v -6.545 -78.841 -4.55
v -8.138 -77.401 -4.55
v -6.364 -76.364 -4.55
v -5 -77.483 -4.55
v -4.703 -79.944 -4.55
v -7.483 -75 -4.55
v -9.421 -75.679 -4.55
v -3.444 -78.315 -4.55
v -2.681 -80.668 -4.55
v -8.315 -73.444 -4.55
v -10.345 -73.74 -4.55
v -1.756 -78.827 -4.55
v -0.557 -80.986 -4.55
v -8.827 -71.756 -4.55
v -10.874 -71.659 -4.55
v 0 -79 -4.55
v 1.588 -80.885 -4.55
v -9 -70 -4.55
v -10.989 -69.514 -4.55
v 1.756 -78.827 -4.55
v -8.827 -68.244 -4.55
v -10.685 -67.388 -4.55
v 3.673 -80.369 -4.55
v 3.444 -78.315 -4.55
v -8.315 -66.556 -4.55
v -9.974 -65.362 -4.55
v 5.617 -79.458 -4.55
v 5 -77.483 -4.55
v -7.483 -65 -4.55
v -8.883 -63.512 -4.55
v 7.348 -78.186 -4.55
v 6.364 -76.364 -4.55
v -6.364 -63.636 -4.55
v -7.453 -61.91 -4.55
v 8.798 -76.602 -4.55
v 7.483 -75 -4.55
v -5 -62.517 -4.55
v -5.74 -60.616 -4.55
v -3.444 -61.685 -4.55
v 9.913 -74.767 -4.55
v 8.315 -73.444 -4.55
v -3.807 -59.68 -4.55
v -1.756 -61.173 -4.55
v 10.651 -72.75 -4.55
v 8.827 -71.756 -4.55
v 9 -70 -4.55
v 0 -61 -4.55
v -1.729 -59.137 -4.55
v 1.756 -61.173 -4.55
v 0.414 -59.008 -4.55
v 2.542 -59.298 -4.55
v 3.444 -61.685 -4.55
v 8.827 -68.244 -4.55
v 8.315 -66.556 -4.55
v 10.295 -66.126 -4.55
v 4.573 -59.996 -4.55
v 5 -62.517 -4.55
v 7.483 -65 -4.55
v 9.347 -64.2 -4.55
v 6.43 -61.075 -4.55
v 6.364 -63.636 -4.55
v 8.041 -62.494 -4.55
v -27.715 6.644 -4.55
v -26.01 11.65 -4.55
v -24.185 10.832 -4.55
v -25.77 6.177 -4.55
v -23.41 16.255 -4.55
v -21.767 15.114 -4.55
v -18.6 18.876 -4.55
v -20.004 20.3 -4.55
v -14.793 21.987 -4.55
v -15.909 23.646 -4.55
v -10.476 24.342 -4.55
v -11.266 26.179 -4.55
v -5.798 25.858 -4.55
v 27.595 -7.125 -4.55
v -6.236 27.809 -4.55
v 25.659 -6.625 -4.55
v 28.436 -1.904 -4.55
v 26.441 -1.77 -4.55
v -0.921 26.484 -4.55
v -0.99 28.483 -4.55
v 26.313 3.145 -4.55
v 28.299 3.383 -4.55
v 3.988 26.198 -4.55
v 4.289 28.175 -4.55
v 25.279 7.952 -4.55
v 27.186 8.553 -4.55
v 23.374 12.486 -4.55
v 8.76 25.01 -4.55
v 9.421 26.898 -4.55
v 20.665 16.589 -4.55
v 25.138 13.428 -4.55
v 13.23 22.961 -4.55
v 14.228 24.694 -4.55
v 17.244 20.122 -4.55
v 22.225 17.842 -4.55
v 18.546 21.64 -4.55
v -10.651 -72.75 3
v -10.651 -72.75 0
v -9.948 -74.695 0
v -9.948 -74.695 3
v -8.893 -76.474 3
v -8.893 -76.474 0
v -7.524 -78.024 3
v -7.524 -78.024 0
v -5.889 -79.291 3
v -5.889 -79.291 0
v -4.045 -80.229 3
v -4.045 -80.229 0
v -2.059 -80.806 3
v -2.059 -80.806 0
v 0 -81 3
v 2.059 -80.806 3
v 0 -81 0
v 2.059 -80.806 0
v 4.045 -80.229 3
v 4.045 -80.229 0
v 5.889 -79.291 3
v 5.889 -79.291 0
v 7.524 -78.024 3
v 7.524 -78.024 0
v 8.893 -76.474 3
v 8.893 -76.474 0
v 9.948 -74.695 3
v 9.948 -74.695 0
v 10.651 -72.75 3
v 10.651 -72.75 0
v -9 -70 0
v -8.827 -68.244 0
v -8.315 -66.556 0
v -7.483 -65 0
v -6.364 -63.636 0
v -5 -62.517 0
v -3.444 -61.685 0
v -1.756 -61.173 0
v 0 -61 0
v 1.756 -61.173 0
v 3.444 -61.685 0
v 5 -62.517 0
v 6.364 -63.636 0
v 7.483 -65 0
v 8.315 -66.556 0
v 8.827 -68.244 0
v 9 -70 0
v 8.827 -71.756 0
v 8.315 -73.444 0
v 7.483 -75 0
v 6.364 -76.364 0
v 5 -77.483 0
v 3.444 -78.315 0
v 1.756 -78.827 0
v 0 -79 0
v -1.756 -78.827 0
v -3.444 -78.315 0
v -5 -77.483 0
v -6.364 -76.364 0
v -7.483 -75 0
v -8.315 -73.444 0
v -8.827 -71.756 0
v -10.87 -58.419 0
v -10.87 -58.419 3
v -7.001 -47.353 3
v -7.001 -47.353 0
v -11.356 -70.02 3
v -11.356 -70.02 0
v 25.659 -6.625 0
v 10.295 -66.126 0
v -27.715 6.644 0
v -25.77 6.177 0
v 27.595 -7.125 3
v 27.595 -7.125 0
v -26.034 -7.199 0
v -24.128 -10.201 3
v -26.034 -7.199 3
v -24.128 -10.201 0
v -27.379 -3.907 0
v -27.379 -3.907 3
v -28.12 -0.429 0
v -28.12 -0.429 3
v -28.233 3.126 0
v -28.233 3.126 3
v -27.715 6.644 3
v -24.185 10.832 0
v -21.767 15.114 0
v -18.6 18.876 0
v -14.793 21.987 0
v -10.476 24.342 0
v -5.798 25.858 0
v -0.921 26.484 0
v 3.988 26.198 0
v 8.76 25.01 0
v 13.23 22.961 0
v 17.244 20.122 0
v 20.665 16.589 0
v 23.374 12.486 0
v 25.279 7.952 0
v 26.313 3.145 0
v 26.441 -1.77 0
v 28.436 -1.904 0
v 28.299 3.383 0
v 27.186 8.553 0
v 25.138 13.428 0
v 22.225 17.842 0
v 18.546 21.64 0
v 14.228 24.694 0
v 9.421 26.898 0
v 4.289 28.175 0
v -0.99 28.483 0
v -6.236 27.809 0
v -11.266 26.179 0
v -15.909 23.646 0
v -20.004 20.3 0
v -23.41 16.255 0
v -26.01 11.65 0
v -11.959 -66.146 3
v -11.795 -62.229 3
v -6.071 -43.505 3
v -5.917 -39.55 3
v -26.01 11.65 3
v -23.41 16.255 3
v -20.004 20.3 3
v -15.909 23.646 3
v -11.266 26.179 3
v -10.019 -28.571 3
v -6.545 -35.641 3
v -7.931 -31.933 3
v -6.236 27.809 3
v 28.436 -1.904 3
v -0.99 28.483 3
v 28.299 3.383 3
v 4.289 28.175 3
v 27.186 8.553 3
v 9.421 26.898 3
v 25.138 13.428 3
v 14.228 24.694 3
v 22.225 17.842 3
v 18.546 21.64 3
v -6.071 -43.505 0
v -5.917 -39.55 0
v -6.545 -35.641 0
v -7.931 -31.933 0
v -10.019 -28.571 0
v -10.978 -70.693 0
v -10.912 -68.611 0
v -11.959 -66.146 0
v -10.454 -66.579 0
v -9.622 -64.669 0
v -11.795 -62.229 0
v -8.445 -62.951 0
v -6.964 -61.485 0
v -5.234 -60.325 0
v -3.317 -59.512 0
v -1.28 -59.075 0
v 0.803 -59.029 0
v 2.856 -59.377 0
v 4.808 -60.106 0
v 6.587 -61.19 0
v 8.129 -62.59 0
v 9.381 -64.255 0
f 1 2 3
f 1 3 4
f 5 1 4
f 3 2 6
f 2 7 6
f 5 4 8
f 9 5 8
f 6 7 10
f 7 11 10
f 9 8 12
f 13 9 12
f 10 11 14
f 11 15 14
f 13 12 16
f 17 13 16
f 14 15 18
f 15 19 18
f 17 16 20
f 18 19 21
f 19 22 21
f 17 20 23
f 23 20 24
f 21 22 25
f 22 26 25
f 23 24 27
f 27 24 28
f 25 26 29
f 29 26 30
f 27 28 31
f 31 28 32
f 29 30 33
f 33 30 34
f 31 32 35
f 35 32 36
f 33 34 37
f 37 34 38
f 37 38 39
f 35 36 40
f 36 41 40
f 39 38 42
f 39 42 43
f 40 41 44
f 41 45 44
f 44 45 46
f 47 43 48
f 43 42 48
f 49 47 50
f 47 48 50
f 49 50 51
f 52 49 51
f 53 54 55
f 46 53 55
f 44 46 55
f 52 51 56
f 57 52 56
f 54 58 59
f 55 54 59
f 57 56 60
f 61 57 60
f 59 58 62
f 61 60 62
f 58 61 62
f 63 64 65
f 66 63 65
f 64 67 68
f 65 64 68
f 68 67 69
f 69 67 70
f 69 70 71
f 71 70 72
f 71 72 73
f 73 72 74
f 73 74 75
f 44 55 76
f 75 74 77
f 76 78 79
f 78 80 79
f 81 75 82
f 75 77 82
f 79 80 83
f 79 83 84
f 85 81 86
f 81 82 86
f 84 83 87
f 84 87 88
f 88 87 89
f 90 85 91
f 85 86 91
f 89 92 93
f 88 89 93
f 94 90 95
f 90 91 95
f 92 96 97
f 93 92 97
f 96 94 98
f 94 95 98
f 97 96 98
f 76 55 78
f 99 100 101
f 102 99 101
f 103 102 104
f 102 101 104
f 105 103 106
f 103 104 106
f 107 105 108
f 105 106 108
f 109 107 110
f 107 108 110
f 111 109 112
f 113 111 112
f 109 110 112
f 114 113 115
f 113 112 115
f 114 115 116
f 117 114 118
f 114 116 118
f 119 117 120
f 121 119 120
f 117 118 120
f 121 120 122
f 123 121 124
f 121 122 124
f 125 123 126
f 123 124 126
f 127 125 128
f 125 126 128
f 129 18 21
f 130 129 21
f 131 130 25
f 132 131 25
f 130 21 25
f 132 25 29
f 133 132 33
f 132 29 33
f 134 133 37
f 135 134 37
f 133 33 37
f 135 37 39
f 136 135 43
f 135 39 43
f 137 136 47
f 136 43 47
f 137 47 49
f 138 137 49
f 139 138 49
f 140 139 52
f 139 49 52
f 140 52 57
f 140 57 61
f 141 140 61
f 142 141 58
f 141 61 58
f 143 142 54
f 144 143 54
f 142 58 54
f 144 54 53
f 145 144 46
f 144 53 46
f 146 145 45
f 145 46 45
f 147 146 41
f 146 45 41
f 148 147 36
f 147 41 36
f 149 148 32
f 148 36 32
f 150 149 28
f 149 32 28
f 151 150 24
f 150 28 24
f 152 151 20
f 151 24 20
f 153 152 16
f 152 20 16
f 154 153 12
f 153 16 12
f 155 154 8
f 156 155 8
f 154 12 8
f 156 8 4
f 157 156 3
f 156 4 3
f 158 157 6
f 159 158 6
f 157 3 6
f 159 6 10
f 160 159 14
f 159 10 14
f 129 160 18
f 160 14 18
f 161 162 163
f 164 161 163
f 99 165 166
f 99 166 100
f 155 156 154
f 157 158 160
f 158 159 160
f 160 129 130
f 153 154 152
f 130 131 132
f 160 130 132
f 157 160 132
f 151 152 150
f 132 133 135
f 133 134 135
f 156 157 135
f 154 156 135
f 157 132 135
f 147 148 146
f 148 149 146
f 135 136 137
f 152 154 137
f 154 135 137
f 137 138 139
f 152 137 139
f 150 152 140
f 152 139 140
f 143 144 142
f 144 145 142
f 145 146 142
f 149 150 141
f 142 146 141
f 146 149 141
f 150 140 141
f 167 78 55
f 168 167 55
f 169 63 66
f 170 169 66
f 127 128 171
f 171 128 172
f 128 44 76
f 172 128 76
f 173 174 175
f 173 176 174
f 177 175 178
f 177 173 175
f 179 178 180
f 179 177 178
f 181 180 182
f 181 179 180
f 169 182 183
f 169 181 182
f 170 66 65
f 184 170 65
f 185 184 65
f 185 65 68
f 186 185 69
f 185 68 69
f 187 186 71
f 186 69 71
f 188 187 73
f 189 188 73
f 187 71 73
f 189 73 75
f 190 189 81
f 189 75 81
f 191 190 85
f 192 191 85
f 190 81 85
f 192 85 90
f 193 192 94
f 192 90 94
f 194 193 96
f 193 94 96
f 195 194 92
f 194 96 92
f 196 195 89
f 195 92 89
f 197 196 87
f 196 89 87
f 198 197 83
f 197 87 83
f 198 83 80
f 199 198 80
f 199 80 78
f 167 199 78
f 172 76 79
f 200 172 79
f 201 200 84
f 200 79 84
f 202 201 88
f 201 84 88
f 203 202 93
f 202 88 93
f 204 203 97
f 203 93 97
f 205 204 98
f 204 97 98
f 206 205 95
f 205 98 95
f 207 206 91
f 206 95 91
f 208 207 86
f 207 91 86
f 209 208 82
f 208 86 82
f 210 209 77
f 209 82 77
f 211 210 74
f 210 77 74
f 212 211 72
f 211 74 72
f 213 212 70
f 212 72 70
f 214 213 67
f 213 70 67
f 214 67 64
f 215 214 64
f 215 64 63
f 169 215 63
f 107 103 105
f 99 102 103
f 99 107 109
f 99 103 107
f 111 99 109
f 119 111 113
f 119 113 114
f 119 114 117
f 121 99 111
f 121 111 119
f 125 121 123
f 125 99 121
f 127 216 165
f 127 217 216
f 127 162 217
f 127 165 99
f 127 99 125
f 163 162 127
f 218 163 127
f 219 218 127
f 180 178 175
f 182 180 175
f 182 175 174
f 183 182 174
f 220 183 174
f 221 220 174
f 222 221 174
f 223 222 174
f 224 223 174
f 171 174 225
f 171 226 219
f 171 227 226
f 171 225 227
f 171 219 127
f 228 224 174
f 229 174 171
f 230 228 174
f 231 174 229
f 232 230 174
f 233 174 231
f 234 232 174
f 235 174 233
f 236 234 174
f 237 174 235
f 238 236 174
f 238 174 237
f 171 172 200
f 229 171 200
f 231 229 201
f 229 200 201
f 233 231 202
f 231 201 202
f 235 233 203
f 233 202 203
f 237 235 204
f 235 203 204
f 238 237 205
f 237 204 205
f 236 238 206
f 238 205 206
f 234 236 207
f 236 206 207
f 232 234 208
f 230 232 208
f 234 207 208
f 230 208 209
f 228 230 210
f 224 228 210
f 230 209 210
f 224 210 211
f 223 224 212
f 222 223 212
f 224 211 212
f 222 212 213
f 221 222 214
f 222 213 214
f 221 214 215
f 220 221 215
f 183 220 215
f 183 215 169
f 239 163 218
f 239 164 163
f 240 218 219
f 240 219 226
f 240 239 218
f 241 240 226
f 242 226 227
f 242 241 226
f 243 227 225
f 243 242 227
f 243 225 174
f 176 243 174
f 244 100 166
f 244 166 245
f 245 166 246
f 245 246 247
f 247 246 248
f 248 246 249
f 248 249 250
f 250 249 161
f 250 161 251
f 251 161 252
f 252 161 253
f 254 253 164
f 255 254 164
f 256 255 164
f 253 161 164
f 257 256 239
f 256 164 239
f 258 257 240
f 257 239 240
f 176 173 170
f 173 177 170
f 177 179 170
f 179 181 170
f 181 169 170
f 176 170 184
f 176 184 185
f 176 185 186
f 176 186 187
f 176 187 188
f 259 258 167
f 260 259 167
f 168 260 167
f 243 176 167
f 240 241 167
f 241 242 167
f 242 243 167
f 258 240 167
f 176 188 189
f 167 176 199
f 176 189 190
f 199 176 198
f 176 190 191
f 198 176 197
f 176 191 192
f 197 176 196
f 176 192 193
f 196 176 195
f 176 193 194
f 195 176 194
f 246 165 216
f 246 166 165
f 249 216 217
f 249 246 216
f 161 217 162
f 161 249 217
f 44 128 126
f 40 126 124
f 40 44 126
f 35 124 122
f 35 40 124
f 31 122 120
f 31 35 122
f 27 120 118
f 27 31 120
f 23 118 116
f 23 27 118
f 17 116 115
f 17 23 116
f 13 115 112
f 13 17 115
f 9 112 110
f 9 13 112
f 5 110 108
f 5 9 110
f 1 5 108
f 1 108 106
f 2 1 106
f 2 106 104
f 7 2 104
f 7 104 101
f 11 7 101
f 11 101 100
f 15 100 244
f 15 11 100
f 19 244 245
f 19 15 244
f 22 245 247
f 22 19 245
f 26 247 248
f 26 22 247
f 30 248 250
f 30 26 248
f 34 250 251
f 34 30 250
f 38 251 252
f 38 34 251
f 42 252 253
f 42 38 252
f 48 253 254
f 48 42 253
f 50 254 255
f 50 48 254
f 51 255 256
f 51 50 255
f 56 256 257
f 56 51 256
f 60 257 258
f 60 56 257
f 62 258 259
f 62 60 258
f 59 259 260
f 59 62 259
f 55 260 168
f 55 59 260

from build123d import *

# Parameters (mm, degrees)
EXTRUDE_1_DEPTH     = 3
CUT_EXTRUDE_1_DEPTH = 10
FILLET_2_R          = 20
EXTRUDE_START       = 4.55
SKETCH_4_R          = 11
SKETCH_4_R_2        = 9
EXTRUDE_2_DEPTH     = 4.55
EXTRUDE_3_DEPTH     = 4.55


with BuildPart() as part:
    # 草图1 → 凸台-拉伸1 (new body)
    with BuildSketch(Plane.XY):
        with BuildLine():
            Line((-27.595006342, -7.125), (-10.650704202, -72.75))
            ThreePointArc((-10.650704202, -72.75), (0, -81), (10.650704202, -72.75))
            Line((10.650704202, -72.75), (27.595006342, -7.125))
            ThreePointArc((27.595006342, -7.125), (0, 28.5), (-27.595006342, -7.125))
        make_face()
    extrude(amount=EXTRUDE_1_DEPTH)

    # 草图2 → 切除-拉伸1 (cut)
    with BuildSketch(Plane.XY.offset(3)):
        Polygon((-12.872325689, -64.14569698), (-3.433026856, -37.146128717), (-28.154763001, -4.957071782), align=None)
    extrude(amount=-CUT_EXTRUDE_1_DEPTH, mode=Mode.SUBTRACT)

    # 圆角2
    fillet_2_edges = [part.edges().sort_by_distance(p)[0] for p in [
        (-12.872325689, -64.14569698, 1.5),
        (-28.03841186, -5.108567351, 1.5),
        (-3.433026856, -37.146128717, 1.5),
    ]]
    fillet(fillet_2_edges, radius=FILLET_2_R)

    # 草图4 → 凸台-拉伸2 (add)
    with BuildSketch(Plane(origin=(0, 0, 0), x_dir=(-1, 0, 0), z_dir=(0, 0, -1)).offset(EXTRUDE_START)):
        with Locations((0, -70)):
            Circle(SKETCH_4_R)
        with Locations((0, -70)):
            Circle(SKETCH_4_R_2, mode=Mode.SUBTRACT)
    extrude(amount=-EXTRUDE_2_DEPTH)

    # 草图5 → 凸台-拉伸3 (add)
    with BuildSketch(Plane(origin=(0, 0, 0), x_dir=(-1, 0, 0), z_dir=(0, 0, -1)).offset(EXTRUDE_START)):
        with BuildLine():
            Line((-10.650704202, -72.75), (-27.595006342, -7.125))
            ThreePointArc((-27.595006342, -7.125), (-6.884619071, 27.655958133), (27.714816001, 6.643716885))
            Line((27.714816001, 6.643716885), (25.769916632, 6.177491138))
            ThreePointArc((25.769916632, 6.177491138), (-6.401487908, 25.715189141), (-25.658514669, -6.625))
            Line((-25.658514669, -6.625), (-10.295351359, -66.126275643))
            ThreePointArc((-10.295351359, -66.126275643), (-10.984204203, -69.410713976), (-10.650704202, -72.75))
        make_face()
    extrude(amount=-EXTRUDE_3_DEPTH)


solid = part.part
